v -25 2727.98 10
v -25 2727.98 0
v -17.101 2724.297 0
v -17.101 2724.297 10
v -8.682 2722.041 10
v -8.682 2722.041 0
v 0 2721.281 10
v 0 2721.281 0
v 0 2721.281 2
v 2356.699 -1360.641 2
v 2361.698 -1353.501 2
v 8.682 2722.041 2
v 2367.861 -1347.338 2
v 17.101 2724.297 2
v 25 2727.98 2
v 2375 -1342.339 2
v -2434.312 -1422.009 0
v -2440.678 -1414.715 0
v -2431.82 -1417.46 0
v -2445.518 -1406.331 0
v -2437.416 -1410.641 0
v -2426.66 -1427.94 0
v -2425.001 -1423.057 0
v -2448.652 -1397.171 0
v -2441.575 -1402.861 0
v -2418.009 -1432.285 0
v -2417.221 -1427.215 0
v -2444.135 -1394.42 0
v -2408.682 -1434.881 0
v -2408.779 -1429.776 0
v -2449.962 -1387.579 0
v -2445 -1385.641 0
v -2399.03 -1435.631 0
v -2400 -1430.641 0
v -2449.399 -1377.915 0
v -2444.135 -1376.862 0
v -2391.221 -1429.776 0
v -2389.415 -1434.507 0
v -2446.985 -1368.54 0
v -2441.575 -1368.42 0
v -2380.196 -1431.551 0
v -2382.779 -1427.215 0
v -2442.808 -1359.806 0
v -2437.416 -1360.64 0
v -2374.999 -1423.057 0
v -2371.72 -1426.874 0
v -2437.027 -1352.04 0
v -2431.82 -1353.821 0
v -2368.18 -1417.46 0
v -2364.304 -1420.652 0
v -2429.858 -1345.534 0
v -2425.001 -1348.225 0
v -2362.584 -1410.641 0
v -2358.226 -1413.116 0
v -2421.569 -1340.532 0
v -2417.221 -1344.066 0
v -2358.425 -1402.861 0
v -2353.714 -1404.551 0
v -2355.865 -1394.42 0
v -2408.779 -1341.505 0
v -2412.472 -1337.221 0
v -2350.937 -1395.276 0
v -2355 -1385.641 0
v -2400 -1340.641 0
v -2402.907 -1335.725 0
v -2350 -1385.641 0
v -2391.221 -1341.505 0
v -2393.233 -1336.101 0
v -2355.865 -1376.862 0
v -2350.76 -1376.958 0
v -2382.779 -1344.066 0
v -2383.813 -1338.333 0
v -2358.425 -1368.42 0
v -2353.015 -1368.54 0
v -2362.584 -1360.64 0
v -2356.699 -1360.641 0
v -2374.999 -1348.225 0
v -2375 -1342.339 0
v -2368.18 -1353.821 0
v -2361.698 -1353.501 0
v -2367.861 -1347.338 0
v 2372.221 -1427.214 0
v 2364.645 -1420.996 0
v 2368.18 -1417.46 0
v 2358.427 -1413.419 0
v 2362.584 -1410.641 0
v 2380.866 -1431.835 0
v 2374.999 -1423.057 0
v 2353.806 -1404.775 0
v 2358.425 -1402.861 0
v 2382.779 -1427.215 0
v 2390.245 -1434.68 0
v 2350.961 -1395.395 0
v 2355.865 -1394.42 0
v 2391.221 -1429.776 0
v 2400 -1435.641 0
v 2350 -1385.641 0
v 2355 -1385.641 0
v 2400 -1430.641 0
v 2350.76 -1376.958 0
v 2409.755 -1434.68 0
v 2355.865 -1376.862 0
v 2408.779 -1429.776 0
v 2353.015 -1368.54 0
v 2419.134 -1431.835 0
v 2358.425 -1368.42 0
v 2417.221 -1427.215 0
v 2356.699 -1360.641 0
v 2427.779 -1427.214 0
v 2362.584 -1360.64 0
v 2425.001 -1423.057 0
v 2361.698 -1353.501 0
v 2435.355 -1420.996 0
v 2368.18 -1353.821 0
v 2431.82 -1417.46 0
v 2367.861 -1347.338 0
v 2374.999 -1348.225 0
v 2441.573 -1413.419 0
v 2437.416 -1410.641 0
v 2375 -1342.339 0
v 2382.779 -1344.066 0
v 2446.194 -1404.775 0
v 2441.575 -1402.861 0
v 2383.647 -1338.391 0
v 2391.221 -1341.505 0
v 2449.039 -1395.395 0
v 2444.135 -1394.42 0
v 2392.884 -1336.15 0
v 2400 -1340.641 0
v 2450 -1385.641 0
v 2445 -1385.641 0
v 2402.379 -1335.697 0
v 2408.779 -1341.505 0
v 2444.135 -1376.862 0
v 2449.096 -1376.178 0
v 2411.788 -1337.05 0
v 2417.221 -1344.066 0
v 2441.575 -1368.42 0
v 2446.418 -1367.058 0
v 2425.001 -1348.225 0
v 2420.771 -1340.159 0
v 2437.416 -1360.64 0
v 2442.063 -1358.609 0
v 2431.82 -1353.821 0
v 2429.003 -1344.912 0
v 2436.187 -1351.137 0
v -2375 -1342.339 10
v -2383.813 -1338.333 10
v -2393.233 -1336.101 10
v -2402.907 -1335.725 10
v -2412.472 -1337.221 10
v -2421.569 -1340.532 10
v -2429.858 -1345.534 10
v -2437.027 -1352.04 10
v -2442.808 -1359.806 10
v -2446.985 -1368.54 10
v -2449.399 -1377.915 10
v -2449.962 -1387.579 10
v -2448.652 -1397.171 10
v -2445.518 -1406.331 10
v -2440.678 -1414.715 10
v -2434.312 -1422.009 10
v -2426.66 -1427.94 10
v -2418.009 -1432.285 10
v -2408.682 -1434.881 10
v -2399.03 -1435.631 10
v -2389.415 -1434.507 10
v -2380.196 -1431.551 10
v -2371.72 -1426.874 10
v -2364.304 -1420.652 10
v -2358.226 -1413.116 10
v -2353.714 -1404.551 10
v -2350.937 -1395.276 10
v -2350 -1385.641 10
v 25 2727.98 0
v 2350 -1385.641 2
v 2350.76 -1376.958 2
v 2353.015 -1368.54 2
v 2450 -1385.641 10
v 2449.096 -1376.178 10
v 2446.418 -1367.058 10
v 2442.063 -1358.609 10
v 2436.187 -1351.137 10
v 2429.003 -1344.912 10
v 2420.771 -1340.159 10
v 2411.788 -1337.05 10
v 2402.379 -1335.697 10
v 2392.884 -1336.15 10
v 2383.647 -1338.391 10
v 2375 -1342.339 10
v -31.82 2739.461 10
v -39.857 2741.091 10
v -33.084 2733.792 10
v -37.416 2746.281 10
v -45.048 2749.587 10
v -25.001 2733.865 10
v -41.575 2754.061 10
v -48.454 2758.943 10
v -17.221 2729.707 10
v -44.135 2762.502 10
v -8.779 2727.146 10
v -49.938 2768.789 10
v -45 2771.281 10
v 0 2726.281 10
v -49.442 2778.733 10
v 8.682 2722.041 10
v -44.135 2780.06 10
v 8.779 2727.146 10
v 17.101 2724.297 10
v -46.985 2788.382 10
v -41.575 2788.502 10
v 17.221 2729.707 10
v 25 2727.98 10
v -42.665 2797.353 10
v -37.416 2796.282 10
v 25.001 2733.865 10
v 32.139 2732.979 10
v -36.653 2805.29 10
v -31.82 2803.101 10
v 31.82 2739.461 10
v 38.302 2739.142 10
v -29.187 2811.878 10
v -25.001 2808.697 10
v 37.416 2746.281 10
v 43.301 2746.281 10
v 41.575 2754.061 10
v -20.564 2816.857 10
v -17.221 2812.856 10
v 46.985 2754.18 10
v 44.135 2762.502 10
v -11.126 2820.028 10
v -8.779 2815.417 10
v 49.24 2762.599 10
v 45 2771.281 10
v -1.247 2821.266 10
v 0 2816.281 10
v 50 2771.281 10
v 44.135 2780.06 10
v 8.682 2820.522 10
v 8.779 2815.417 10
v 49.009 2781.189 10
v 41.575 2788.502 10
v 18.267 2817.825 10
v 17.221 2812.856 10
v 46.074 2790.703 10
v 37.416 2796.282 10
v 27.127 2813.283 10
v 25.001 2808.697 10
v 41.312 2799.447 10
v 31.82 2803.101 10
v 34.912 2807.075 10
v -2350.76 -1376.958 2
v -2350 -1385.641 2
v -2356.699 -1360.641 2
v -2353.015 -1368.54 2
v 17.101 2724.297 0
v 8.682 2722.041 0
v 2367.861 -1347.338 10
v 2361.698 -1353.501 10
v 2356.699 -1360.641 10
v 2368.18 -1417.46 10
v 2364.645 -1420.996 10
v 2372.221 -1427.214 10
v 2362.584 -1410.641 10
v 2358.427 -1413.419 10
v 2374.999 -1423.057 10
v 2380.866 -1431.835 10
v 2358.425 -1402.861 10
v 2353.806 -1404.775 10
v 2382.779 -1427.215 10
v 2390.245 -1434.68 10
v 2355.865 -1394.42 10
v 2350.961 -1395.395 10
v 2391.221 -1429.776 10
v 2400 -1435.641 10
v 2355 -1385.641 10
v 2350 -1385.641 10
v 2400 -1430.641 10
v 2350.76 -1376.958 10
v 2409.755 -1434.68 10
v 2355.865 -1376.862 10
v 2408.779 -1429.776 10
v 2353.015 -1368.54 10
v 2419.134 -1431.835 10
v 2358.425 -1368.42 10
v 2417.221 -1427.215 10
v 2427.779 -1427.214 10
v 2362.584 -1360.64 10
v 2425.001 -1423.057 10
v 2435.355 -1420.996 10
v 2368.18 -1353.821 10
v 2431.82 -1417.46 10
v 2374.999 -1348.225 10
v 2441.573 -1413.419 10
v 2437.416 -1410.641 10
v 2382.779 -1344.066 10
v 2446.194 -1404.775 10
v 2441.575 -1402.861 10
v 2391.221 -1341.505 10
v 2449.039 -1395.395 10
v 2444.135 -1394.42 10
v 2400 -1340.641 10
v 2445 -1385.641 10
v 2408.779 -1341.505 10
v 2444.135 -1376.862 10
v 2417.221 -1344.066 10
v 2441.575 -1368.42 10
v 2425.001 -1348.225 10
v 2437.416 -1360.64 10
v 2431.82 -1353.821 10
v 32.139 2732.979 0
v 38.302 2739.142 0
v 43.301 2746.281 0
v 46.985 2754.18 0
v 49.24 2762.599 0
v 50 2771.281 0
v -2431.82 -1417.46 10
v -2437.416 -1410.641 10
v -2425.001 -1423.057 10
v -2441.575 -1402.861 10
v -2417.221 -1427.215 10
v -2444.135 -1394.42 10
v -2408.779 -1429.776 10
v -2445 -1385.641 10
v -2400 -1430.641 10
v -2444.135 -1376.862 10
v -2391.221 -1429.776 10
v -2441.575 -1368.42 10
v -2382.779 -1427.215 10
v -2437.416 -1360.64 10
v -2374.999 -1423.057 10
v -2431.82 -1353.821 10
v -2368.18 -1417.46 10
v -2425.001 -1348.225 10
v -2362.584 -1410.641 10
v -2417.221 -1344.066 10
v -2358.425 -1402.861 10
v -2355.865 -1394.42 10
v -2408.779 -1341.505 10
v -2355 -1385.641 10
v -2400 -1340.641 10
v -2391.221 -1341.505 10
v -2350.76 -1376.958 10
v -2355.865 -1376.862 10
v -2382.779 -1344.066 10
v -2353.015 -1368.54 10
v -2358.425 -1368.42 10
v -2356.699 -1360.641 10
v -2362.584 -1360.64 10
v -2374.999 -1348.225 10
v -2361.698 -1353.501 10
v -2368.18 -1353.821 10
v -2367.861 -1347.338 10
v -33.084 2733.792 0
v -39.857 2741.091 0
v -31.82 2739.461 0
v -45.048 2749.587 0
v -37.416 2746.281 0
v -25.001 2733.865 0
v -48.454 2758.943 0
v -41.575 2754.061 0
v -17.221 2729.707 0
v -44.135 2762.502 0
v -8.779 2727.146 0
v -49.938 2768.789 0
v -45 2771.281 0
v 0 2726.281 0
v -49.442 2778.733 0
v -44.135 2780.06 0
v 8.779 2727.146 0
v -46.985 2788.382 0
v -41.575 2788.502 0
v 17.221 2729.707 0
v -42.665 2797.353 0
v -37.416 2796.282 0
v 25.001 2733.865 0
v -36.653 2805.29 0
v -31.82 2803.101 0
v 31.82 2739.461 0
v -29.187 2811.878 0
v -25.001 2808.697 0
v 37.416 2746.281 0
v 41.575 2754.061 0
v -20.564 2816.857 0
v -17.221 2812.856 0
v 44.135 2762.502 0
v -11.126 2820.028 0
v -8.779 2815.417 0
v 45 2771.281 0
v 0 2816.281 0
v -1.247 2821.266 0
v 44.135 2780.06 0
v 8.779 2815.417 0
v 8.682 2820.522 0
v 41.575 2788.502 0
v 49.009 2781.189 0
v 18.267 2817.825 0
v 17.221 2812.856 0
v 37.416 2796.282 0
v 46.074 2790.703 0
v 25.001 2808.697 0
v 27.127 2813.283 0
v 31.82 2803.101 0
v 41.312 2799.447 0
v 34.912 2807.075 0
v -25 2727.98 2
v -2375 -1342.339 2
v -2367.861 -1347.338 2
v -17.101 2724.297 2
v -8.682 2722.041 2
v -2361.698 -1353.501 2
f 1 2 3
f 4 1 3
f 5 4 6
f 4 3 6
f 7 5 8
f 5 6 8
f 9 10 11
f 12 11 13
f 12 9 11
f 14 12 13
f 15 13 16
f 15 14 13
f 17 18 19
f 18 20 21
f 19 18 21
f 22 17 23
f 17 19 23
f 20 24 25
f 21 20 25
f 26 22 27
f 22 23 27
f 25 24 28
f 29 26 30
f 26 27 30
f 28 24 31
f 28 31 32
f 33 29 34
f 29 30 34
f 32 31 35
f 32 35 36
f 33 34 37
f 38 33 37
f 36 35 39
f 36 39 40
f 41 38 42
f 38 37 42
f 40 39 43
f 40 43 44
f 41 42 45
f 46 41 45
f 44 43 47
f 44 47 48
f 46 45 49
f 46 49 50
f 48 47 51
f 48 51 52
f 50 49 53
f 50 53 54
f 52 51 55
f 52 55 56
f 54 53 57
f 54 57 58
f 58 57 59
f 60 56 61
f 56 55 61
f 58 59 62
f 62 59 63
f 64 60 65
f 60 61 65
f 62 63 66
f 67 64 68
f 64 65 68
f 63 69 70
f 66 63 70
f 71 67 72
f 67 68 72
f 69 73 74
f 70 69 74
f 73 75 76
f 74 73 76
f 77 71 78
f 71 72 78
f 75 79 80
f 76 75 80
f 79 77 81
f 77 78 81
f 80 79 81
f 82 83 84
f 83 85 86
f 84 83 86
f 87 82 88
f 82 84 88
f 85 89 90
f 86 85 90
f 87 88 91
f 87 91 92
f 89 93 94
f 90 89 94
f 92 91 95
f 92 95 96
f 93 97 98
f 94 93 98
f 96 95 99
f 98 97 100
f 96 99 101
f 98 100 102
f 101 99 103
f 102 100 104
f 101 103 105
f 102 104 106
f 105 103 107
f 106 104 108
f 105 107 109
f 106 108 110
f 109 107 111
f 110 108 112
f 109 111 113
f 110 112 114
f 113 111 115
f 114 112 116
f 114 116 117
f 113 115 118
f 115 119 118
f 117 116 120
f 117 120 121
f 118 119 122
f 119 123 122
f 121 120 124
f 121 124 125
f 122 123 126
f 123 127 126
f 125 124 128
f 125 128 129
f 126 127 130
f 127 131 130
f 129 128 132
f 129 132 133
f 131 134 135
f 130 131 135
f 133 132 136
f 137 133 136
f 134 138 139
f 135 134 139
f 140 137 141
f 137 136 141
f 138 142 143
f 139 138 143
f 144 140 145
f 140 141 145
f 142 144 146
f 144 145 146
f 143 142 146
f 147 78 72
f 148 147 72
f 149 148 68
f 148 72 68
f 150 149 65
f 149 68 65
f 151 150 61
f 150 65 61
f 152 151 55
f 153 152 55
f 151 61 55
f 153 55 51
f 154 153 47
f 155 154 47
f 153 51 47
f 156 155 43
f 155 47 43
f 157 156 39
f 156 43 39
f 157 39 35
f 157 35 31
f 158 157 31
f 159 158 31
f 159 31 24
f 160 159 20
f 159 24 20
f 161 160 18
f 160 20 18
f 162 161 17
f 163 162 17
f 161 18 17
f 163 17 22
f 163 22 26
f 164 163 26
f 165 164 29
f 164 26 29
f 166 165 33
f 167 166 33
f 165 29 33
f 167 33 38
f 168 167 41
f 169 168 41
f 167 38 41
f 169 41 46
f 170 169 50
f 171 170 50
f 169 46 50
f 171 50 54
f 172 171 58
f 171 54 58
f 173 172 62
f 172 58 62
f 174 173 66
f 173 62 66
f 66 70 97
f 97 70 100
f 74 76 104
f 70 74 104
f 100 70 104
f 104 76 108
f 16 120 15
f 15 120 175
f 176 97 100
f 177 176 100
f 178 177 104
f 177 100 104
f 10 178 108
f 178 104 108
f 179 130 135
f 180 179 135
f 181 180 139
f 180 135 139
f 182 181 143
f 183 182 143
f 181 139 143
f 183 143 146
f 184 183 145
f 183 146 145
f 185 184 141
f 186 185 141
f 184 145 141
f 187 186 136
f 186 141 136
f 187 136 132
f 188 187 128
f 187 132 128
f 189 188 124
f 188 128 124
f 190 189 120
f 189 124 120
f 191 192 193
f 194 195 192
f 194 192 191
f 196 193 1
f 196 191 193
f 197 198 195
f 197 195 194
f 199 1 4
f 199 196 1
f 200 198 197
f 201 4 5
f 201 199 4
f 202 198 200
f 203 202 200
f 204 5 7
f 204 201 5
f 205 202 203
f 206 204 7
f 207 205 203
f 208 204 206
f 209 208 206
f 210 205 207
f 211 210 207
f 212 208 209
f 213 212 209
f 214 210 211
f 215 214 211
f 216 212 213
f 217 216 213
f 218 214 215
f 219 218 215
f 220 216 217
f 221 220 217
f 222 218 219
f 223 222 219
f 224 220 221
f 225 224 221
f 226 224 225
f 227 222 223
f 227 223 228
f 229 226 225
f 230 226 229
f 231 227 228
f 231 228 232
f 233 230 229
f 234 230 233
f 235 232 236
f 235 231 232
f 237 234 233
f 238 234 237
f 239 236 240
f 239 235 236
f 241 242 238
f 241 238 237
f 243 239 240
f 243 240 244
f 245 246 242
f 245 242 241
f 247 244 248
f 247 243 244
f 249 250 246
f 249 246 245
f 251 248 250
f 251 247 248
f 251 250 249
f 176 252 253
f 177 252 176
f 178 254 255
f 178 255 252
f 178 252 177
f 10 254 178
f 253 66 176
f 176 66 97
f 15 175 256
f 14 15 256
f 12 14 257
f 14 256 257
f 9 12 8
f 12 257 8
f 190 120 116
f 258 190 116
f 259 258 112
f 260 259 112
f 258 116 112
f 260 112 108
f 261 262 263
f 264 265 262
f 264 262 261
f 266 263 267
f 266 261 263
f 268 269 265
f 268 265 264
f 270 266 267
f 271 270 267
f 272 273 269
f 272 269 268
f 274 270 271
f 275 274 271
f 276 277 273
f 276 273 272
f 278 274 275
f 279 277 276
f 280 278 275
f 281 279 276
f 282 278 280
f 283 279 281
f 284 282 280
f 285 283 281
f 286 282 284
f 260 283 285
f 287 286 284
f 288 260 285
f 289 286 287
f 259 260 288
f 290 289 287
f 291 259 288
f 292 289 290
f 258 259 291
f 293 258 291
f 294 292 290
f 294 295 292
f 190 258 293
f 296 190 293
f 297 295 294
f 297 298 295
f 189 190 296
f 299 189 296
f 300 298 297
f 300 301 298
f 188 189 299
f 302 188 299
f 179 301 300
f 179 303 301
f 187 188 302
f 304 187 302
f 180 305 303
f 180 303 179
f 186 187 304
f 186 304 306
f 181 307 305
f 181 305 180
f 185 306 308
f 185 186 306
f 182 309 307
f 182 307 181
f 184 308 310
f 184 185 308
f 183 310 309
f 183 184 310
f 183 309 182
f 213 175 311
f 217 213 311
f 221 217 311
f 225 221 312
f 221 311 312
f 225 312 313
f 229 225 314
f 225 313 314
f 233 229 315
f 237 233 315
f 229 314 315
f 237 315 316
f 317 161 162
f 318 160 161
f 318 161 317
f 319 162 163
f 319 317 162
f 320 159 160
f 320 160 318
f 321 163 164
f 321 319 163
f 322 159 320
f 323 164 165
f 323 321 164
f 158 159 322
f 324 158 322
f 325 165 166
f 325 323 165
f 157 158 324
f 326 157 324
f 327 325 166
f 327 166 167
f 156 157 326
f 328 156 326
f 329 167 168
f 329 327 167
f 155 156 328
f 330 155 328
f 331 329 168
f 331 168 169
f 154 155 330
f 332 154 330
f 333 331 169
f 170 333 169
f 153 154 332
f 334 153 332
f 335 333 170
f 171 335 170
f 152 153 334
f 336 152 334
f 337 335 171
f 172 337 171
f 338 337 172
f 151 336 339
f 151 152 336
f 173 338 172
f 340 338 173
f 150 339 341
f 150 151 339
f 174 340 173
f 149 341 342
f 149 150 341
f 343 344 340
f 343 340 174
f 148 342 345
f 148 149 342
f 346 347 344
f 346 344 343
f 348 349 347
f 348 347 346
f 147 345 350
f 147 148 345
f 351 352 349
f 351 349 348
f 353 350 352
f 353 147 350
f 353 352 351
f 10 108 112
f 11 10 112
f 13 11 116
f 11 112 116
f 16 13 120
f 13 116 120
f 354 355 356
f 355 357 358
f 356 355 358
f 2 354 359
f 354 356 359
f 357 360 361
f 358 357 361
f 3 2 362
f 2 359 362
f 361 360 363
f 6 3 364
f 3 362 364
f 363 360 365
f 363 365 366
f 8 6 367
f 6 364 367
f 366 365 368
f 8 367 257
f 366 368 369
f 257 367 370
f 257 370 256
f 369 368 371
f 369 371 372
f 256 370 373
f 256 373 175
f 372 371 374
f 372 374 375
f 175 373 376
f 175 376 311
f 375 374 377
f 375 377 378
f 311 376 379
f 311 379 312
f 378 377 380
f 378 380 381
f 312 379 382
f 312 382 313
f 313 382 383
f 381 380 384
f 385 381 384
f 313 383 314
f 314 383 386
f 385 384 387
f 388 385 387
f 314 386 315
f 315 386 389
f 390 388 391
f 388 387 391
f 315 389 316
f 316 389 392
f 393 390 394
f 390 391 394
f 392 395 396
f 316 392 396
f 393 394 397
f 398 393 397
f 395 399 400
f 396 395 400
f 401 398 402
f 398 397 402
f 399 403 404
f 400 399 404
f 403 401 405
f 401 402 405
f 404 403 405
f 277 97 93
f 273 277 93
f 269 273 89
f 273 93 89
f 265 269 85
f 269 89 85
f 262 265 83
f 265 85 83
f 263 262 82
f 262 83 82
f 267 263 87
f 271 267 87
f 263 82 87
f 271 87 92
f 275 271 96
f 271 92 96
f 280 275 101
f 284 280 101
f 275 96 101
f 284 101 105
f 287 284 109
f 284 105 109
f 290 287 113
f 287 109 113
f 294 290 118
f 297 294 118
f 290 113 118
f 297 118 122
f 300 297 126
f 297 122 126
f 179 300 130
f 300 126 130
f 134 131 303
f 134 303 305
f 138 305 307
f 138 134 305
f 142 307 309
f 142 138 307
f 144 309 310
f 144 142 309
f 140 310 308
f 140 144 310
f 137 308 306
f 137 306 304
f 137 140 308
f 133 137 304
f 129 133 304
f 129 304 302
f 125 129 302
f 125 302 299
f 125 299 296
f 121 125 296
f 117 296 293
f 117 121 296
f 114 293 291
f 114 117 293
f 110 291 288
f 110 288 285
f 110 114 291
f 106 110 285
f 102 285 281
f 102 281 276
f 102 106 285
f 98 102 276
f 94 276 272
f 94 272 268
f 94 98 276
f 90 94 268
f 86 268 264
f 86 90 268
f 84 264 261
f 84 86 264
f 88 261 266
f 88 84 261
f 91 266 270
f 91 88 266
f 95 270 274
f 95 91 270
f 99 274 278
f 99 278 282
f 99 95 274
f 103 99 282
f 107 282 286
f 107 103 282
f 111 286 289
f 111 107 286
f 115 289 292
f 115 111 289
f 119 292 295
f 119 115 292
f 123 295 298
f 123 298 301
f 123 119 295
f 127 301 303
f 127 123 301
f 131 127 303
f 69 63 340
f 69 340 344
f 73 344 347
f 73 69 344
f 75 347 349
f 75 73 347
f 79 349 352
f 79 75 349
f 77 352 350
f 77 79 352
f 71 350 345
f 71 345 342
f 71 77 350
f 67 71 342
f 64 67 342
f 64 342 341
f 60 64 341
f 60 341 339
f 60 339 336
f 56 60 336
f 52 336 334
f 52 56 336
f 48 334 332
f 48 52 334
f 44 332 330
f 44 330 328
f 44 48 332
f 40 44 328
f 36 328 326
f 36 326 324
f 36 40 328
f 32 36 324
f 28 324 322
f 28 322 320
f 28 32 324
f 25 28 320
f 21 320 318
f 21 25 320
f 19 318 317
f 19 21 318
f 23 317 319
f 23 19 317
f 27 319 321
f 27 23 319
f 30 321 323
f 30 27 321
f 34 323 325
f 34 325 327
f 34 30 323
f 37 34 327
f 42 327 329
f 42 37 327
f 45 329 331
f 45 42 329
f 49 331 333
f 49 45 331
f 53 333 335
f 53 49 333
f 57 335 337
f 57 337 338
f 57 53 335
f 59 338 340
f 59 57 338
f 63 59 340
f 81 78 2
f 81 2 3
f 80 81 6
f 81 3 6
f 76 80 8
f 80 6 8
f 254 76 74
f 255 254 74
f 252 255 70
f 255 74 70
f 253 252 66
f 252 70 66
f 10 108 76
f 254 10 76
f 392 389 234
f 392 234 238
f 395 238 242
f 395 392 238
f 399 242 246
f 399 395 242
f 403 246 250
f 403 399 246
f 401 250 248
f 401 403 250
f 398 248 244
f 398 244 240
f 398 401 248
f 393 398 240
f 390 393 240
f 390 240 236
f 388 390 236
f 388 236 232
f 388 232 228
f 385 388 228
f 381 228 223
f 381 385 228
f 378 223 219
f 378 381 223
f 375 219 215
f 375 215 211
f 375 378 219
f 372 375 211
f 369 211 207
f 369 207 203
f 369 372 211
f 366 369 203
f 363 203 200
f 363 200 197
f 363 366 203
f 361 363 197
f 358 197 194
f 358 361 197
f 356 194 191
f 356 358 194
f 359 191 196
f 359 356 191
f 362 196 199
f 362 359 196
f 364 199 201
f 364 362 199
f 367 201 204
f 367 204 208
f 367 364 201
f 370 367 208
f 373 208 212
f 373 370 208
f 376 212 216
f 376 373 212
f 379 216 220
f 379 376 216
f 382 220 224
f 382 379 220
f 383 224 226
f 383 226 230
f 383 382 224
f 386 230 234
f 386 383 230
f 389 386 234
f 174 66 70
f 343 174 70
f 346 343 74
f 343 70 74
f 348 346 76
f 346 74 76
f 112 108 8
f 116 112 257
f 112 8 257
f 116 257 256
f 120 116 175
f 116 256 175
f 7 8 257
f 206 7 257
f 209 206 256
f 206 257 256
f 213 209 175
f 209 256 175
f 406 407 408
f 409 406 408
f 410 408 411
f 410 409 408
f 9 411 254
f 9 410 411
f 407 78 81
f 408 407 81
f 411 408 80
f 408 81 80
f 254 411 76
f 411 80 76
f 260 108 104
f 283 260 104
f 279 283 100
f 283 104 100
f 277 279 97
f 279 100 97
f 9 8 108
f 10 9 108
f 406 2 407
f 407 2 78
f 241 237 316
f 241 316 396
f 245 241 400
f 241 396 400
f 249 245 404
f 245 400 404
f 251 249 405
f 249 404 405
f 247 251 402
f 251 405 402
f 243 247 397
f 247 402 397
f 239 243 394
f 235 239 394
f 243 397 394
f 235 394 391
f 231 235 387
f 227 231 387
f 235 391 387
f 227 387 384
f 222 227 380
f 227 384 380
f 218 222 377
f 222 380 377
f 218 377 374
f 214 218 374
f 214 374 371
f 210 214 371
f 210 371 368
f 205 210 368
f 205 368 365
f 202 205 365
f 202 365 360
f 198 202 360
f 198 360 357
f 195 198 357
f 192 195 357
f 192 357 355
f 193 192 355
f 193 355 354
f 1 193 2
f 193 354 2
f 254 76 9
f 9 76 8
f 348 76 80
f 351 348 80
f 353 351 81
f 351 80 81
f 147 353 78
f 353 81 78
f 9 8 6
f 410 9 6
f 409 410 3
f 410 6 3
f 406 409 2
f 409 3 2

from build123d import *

# Parameters (mm, degrees)
F0_R     = 45
F1_DEPTH = 10
F2_DEPTH = 2


with BuildPart() as f1:
    # F0 (on Top) → F1 (new body)
    with BuildSketch(Plane.XY):
        with BuildLine():
            ThreePointArc((-2350, -1385.640646), (-2351.703709, -1372.699694), (-2356.69873, -1360.640646))
            ThreePointArc((-2356.69873, -1360.640646), (-2364.644661, -1350.285307), (-2375, -1342.339376))
            ThreePointArc((-2375, -1342.339376), (-2443.30127, -1410.640646), (-2350, -1385.640646))
        make_face()
        with Locations((-2400, -1385.640646)):
            Circle(F0_R, mode=Mode.SUBTRACT)
        with BuildLine():
            ThreePointArc((2450, -1385.640646), (2425, -1342.339376), (2375, -1342.339376))
            ThreePointArc((2375, -1342.339376), (2364.644661, -1350.285307), (2356.69873, -1360.640646))
            ThreePointArc((2356.69873, -1360.640646), (2351.703709, -1372.699694), (2350, -1385.640646))
            ThreePointArc((2350, -1385.640646), (2400, -1435.640646), (2450, -1385.640646))
        make_face()
        with Locations((2400, -1385.640646)):
            Circle(F0_R, mode=Mode.SUBTRACT)
        with BuildLine():
            ThreePointArc((0, 2721.281292), (12.940952, 2722.985001), (25, 2727.980022))
            ThreePointArc((25, 2727.980022), (43.30127, 2746.281292), (50, 2771.281292))
            ThreePointArc((50, 2771.281292), (-25, 2814.582562), (-25, 2727.980022))
            ThreePointArc((-25, 2727.980022), (-12.940952, 2722.985001), (0, 2721.281292))
        make_face()
        with Locations((0, 2771.281292)):
            Circle(F0_R, mode=Mode.SUBTRACT)
    extrude(amount=F1_DEPTH)


with BuildPart() as f2:
    # F0 (on Top) → F2 (new body)
    with BuildSketch(Plane.XY):
        with BuildLine():
            Line((-2356.69873, -1360.640646), (0, 2721.281292))
            ThreePointArc((0, 2721.281292), (-12.940952, 2722.985001), (-25, 2727.980022))
            Line((-25, 2727.980022), (-2375, -1342.339376))
            ThreePointArc((-2375, -1342.339376), (-2364.644661, -1350.285307), (-2356.69873, -1360.640646))
        make_face()
        with BuildLine():
            Line((2375, -1342.339376), (25, 2727.980022))
            ThreePointArc((25, 2727.980022), (12.940952, 2722.985001), (0, 2721.281292))
            Line((0, 2721.281292), (2356.69873, -1360.640646))
            ThreePointArc((2356.69873, -1360.640646), (2364.644661, -1350.285307), (2375, -1342.339376))
        make_face()
        with BuildLine():
            ThreePointArc((2350, -1385.640646), (2351.703709, -1372.699694), (2356.69873, -1360.640646))
            Line((2356.69873, -1360.640646), (-2356.69873, -1360.640646))
            ThreePointArc((-2356.69873, -1360.640646), (-2351.703709, -1372.699694), (-2350, -1385.640646))
            Line((-2350, -1385.640646), (2350, -1385.640646))
        make_face()
    extrude(amount=F2_DEPTH)


solid = Compound([f1.part, f2.part])
